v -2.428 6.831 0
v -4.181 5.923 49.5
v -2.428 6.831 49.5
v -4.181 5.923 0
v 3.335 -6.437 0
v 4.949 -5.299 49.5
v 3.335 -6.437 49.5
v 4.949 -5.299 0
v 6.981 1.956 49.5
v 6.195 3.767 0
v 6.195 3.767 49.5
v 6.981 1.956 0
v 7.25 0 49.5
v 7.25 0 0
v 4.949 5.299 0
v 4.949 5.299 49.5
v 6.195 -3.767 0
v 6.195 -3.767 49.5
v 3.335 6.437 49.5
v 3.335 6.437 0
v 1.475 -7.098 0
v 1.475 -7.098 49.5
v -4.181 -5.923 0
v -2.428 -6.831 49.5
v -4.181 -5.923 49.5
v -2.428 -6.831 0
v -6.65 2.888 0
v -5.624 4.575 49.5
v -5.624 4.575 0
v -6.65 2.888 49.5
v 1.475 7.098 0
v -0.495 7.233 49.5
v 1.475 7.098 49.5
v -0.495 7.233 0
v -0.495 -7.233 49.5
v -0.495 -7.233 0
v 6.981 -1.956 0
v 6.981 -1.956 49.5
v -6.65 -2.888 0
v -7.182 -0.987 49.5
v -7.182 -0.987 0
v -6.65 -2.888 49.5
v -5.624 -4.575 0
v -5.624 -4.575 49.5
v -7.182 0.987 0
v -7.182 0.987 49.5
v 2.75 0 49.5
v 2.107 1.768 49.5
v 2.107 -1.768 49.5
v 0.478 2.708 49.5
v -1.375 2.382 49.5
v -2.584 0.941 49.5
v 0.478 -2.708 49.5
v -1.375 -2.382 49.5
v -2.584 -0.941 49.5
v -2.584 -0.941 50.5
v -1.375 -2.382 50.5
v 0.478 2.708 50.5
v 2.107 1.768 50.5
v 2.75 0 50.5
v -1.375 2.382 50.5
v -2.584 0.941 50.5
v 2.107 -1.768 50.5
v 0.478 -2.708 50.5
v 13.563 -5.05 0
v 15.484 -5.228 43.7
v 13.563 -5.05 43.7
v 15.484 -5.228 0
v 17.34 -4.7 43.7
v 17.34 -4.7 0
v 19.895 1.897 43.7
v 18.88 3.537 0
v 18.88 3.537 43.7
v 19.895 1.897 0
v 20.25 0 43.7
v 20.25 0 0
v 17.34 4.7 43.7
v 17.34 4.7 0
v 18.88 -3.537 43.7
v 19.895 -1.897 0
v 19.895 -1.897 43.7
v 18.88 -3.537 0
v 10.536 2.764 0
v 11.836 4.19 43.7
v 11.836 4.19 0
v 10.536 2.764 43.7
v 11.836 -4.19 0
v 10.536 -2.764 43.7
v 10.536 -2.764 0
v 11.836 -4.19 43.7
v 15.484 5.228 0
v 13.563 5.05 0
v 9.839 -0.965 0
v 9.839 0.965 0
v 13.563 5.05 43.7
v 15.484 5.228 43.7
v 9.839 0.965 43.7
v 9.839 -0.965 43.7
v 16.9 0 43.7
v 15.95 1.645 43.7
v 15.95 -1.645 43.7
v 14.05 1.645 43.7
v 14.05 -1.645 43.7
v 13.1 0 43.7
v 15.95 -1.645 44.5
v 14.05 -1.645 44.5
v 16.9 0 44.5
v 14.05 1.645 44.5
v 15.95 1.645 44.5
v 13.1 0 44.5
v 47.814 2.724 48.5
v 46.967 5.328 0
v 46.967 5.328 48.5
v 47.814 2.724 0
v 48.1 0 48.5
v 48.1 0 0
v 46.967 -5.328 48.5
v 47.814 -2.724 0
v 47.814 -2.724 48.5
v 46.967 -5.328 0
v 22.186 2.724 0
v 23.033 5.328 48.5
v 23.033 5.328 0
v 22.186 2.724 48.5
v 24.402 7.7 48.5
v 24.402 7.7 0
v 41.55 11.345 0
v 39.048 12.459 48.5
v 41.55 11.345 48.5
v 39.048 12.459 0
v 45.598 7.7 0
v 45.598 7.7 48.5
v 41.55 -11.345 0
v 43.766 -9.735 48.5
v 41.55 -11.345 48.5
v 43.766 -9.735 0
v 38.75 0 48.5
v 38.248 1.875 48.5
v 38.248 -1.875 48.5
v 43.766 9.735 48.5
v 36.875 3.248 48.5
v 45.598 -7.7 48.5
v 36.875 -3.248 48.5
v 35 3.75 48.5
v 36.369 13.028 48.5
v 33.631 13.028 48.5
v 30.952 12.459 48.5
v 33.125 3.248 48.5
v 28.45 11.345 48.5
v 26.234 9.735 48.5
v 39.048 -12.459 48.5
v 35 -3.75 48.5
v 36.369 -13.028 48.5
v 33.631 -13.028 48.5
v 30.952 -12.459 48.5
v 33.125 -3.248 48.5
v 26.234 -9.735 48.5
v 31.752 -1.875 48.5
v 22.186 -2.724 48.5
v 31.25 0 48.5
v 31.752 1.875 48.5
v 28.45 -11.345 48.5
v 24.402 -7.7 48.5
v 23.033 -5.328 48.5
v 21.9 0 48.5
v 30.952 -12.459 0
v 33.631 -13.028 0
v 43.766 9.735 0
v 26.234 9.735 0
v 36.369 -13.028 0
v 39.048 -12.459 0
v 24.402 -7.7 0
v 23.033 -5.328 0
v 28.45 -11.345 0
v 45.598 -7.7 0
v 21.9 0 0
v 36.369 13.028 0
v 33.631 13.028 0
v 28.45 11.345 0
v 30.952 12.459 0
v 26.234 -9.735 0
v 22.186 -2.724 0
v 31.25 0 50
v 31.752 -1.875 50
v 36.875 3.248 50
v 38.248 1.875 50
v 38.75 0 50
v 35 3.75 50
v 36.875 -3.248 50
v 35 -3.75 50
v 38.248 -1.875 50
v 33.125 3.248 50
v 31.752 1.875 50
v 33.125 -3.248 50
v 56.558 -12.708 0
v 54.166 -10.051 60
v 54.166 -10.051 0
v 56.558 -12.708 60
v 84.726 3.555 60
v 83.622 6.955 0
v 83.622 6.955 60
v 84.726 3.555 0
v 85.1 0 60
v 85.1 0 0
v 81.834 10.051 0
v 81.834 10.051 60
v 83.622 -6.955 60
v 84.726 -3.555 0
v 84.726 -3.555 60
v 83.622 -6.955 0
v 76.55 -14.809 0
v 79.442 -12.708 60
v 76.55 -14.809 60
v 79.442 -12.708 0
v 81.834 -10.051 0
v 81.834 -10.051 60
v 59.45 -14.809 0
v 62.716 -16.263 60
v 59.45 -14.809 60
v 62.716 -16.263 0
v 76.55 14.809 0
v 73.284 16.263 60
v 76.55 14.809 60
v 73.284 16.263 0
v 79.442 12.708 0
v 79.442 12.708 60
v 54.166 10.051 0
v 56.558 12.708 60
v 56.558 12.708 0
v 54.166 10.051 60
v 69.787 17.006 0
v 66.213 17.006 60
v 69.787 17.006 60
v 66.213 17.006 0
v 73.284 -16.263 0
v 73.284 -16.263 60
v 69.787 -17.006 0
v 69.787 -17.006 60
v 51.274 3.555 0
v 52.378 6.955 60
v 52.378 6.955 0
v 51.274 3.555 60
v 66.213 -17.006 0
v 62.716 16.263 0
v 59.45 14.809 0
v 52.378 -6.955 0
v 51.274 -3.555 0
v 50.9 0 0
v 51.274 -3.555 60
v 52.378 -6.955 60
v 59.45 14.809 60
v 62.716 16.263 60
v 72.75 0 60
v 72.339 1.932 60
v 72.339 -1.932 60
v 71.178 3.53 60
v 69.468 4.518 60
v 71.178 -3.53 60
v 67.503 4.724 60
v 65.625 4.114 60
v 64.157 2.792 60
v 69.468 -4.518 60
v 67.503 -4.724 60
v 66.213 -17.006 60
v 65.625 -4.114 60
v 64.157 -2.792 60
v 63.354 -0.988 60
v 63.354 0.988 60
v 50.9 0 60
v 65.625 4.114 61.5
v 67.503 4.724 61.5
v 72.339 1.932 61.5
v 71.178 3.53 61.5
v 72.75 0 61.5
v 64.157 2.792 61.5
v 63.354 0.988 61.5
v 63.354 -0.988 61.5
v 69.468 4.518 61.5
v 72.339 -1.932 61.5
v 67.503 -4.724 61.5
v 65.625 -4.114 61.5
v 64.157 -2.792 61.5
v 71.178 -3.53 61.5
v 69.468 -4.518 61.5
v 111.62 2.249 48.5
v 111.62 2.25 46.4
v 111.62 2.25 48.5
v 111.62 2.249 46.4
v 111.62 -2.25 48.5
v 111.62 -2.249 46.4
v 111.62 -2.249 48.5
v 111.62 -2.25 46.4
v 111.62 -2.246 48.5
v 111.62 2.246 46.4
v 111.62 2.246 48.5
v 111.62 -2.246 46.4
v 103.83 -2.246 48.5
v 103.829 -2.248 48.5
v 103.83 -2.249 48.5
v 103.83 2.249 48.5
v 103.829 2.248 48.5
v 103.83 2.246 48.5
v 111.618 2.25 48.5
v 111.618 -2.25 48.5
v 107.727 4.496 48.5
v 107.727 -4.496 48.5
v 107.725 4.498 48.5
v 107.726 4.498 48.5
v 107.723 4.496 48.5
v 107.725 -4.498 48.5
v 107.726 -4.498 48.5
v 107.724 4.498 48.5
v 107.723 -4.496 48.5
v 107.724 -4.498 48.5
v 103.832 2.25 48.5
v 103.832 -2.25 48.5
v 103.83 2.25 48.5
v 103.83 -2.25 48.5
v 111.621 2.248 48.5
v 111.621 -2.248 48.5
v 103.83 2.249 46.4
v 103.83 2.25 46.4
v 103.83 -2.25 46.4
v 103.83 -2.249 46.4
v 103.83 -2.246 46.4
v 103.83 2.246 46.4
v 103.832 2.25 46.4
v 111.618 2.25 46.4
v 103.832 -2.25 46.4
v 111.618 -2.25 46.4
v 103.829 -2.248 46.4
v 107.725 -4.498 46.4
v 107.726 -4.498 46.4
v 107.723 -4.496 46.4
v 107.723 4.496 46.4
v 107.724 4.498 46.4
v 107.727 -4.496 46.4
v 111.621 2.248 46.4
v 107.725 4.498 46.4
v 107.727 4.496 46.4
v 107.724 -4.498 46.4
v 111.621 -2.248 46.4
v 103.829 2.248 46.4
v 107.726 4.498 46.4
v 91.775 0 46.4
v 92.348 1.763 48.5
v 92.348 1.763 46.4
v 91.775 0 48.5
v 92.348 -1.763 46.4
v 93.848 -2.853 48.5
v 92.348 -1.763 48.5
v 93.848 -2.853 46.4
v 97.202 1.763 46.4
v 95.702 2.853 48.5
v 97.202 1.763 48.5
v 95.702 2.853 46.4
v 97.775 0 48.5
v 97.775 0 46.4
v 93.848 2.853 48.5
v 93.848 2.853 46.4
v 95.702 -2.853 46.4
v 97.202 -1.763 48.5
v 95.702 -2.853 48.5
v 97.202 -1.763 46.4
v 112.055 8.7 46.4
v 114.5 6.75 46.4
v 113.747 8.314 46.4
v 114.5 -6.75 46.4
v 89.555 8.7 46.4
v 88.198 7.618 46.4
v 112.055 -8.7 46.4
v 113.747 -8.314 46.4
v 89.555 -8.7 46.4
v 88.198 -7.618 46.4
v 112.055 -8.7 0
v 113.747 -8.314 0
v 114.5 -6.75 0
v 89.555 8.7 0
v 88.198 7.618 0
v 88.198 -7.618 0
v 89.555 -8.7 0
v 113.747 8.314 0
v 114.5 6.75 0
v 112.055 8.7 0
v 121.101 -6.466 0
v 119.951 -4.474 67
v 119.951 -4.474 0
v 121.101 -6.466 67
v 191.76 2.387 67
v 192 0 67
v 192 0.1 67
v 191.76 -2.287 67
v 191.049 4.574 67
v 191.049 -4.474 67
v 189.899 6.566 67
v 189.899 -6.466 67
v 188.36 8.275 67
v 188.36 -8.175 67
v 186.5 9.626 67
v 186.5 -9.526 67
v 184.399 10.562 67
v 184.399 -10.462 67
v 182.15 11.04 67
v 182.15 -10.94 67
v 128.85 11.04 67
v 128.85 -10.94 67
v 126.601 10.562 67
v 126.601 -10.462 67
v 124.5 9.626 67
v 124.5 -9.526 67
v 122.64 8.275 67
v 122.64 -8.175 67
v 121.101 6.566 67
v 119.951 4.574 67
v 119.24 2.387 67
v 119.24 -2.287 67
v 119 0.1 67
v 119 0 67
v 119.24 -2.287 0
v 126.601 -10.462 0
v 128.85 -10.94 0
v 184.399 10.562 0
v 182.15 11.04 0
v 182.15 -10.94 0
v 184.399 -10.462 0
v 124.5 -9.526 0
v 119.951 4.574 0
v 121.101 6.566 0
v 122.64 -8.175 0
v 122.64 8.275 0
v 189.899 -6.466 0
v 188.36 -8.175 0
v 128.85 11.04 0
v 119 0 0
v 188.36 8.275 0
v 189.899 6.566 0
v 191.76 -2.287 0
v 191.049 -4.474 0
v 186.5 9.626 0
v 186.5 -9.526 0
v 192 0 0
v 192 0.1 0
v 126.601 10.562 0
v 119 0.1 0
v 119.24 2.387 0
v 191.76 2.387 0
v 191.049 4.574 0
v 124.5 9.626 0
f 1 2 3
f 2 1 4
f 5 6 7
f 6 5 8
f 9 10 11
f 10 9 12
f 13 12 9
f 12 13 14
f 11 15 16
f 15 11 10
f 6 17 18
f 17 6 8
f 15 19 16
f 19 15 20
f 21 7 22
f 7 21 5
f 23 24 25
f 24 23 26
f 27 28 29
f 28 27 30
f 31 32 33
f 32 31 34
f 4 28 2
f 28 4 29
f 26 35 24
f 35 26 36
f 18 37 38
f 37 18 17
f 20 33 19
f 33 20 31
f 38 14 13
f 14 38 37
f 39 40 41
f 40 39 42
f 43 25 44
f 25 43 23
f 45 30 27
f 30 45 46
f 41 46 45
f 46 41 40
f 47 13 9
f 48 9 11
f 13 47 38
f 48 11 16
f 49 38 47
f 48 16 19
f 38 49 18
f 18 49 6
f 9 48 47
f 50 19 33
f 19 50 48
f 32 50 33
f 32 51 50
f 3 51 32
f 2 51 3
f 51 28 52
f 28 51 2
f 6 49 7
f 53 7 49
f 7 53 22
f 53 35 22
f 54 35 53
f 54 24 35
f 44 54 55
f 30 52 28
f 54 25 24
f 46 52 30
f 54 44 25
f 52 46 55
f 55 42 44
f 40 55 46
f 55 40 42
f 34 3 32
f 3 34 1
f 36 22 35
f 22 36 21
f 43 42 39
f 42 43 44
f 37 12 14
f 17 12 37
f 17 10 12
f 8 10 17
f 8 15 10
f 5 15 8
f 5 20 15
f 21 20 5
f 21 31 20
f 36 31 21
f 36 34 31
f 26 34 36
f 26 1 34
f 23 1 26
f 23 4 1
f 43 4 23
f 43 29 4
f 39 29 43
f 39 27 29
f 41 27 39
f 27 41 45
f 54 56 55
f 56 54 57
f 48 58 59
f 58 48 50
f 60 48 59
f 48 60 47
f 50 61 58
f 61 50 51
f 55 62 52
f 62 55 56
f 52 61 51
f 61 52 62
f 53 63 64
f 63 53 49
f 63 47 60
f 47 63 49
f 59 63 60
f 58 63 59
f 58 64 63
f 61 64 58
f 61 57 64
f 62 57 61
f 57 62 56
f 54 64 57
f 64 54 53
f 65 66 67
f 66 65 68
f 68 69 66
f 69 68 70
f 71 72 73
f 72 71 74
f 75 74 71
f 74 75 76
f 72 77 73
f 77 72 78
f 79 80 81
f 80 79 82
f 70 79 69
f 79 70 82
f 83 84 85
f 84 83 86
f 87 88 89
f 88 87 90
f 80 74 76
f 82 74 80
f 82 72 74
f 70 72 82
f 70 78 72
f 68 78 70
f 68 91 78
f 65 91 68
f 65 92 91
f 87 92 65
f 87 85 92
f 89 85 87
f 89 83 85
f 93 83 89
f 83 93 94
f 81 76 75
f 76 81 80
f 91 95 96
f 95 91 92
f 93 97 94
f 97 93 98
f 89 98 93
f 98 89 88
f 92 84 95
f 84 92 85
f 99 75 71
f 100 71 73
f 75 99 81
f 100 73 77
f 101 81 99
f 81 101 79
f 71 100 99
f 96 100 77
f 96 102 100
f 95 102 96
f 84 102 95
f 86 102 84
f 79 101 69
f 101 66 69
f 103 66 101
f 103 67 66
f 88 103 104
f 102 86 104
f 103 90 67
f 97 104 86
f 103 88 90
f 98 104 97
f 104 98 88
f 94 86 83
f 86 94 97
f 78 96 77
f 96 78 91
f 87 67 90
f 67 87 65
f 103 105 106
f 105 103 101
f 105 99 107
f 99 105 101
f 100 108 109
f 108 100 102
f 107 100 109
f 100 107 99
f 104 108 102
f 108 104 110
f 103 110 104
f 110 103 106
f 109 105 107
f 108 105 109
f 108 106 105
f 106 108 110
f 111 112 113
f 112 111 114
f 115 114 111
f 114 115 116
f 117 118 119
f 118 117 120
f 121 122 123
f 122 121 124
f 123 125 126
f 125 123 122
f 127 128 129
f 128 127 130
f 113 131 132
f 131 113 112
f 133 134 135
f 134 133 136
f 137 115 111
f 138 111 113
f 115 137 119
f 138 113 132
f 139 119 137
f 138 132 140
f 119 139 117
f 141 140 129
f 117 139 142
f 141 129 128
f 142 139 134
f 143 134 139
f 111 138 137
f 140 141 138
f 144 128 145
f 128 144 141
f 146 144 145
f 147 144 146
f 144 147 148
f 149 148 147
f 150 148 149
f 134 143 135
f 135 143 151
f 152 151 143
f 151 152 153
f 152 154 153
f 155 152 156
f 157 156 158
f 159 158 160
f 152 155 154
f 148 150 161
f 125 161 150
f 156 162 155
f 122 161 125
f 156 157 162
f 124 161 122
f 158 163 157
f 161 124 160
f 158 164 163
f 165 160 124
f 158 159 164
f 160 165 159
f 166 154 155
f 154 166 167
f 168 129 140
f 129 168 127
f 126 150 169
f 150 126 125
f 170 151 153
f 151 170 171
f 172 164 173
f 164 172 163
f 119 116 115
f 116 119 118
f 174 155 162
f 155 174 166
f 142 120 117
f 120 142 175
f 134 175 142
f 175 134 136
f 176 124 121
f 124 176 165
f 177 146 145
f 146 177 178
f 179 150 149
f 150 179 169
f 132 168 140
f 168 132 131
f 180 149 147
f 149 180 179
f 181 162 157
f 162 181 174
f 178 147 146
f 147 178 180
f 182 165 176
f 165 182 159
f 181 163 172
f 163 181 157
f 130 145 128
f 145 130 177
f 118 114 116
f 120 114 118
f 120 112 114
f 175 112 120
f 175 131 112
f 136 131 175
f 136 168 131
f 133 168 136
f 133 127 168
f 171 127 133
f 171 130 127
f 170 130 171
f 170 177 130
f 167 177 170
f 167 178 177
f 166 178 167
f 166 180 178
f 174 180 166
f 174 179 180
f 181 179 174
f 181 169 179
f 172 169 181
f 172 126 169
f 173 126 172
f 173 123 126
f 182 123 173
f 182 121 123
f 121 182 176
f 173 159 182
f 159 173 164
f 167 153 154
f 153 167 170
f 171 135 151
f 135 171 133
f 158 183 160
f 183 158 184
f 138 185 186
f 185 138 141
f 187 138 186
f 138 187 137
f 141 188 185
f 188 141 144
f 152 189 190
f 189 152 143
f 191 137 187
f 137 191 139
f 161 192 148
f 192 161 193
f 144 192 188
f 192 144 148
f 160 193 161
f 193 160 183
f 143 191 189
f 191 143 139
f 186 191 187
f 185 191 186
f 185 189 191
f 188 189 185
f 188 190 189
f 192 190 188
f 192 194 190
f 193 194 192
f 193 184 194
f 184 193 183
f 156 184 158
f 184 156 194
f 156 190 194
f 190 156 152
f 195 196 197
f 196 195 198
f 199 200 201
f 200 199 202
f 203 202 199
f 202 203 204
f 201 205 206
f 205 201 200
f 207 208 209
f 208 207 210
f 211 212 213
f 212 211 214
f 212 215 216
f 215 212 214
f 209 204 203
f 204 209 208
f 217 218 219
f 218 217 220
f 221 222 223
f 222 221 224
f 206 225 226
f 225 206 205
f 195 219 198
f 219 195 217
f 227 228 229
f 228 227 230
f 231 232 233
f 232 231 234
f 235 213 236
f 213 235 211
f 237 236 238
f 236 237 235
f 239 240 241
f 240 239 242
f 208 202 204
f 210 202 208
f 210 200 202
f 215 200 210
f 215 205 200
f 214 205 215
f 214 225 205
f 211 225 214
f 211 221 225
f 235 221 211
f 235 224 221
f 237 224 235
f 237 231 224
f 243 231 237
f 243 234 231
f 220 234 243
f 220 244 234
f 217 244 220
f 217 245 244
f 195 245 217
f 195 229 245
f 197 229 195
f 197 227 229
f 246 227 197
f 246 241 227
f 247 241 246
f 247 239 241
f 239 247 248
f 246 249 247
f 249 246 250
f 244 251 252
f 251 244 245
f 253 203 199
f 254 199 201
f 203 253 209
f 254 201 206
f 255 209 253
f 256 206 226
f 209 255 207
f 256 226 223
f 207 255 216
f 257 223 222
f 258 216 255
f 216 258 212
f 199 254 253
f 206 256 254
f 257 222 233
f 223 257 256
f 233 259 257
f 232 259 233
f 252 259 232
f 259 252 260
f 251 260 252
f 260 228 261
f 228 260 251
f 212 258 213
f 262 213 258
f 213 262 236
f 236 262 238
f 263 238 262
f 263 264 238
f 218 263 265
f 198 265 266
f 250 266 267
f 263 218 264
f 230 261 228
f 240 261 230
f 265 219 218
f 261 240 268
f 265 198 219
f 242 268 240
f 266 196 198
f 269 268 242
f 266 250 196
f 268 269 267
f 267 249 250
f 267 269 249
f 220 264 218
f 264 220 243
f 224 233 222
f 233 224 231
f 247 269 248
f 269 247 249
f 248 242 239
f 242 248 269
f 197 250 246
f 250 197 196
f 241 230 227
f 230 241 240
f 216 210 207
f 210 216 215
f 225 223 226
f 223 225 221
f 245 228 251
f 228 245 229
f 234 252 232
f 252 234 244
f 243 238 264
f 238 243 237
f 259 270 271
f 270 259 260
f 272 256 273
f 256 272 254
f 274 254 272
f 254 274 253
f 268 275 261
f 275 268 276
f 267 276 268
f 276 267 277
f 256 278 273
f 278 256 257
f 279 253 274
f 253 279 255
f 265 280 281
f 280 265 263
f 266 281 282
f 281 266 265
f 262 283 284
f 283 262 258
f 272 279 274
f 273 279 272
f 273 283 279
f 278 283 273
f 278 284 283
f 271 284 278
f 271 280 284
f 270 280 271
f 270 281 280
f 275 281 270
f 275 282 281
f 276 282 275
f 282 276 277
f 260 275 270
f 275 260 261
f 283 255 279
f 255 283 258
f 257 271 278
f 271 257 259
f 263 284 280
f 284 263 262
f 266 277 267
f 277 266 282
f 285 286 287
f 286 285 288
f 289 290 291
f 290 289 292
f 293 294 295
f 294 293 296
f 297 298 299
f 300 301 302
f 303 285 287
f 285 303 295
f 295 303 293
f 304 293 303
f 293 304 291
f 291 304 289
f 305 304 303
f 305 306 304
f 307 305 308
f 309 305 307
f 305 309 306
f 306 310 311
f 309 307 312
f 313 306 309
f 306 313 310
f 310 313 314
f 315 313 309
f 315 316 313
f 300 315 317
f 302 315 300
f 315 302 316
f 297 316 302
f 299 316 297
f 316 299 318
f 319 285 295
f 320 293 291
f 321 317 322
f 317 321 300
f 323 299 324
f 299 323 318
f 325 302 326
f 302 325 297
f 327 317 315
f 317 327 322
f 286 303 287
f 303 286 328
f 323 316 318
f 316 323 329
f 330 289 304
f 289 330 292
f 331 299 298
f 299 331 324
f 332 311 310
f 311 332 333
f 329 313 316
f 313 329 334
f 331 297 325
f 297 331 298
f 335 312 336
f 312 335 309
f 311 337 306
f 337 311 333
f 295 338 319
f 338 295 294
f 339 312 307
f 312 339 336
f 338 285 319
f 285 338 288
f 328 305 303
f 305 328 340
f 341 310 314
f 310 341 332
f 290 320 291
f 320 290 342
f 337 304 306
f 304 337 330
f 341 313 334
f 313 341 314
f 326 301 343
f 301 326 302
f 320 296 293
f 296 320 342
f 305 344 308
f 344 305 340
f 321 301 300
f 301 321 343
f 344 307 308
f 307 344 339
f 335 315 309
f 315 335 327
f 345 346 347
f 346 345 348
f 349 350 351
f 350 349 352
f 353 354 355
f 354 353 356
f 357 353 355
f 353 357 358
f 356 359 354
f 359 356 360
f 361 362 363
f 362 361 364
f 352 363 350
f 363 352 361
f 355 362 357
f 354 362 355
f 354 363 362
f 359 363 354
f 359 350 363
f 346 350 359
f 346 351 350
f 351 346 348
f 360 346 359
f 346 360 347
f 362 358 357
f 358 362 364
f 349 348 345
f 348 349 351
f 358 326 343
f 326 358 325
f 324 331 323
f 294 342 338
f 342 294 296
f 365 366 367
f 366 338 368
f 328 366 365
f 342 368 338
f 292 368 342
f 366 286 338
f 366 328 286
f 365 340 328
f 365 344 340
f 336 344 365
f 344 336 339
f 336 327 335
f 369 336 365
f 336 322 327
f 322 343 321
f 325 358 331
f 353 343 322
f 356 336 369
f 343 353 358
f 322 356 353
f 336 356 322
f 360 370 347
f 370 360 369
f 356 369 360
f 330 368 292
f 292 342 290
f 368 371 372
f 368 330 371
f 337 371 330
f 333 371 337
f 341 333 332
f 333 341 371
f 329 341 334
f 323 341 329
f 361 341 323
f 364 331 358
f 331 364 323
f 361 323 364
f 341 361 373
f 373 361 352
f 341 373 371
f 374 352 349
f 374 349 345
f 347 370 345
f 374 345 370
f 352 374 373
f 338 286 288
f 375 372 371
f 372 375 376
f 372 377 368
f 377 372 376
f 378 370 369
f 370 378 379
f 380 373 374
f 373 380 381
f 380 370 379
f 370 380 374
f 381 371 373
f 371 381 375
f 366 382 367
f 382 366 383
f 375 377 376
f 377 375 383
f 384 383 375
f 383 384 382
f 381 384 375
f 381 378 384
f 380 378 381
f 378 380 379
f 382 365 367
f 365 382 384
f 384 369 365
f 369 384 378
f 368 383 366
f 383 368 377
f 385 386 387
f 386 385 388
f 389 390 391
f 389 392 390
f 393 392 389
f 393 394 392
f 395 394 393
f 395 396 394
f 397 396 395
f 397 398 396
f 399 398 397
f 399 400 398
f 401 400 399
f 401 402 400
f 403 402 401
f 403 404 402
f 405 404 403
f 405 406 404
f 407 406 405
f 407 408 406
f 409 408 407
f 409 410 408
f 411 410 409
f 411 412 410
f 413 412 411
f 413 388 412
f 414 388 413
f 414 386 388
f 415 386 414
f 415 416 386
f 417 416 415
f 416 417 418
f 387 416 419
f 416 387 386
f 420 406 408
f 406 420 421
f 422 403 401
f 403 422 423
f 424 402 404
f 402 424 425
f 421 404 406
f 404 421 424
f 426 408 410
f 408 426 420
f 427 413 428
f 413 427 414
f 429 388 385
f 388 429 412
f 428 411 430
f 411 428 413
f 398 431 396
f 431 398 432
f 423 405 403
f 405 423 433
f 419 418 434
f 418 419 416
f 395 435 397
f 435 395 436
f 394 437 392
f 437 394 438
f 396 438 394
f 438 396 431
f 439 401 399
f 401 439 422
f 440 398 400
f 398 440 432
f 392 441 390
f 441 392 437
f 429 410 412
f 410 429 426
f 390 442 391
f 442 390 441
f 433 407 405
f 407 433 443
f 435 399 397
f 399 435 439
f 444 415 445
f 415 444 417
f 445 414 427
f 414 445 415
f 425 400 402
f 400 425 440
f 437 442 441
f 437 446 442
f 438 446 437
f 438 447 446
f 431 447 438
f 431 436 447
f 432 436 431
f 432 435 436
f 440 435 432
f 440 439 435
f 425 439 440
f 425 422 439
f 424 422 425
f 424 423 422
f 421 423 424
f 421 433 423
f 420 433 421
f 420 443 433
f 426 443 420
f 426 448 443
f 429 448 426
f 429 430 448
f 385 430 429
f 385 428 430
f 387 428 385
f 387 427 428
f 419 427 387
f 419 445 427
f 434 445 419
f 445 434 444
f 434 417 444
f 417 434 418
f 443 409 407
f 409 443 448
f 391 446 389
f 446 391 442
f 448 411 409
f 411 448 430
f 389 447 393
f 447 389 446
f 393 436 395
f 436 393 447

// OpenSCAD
/*
 * "Batteries in OpenSCAD by roman_hegglin"
 * https://www.thingiverse.com/thing:155722
 */
/*$fn=70;*/

AA();
translate( v=[15,0,0])
AAA();
translate( v=[35,0,0])
C();
translate( v=[68,0,0])
D();
translate( v=[90,-0.5*(17.5-2*2),0])
9V();
translate( v=[130,0,0])
45V();


module AA()
{
battery_round(50.5, 14.5, 1.0, 5.5);
}

module AAA()
{
battery_round(44.5, 10.5, 0.8, 3.8);
}

module C()
{
battery_round(50, 26.2, 1.5, 7.5);
}

module D()
{
battery_round(61.5, 34.2, 1.5, 9.5);
}

module 9V()
{
r=2;
union(){
	translate(v = [(26.5-2*r)/2-12.95/2, (17.5-2*r)/2, 46.4]) {
		cylinder(h = 48.5-46.4, r=3);
	}

	translate(v = [(26.5-2*r)/2+12.95/2, (17.5-2*r)/2, 46.4]) {
		for ( i = [0:3])
			{ rotate ( i * 60, [0,0,1])
				cube([7.79,4.5,(48.5-46.4)*2],center = true);
			}
		
	}

	minkowski()
	{
	 cube([26.5-2*r,17.5-2*r,46.4/2]);
	 cylinder(r=r,h=46.4/2);
}
}
}

module 45V()
{
h=67;
w=22;
l=62;



minkowski()
{
 cube([l-w/2,0.1,h/2]);
 cylinder(r=w/2,h=h/2);
}

}

module battery_round(h, dia, h_con, dia_con)
{
union() {
	cylinder(h = h-h_con, r=dia/2);
	translate(v = [0, 0, h-h_con]) {
		cylinder(h = h_con, r=dia_con/2);
	}
}
}
